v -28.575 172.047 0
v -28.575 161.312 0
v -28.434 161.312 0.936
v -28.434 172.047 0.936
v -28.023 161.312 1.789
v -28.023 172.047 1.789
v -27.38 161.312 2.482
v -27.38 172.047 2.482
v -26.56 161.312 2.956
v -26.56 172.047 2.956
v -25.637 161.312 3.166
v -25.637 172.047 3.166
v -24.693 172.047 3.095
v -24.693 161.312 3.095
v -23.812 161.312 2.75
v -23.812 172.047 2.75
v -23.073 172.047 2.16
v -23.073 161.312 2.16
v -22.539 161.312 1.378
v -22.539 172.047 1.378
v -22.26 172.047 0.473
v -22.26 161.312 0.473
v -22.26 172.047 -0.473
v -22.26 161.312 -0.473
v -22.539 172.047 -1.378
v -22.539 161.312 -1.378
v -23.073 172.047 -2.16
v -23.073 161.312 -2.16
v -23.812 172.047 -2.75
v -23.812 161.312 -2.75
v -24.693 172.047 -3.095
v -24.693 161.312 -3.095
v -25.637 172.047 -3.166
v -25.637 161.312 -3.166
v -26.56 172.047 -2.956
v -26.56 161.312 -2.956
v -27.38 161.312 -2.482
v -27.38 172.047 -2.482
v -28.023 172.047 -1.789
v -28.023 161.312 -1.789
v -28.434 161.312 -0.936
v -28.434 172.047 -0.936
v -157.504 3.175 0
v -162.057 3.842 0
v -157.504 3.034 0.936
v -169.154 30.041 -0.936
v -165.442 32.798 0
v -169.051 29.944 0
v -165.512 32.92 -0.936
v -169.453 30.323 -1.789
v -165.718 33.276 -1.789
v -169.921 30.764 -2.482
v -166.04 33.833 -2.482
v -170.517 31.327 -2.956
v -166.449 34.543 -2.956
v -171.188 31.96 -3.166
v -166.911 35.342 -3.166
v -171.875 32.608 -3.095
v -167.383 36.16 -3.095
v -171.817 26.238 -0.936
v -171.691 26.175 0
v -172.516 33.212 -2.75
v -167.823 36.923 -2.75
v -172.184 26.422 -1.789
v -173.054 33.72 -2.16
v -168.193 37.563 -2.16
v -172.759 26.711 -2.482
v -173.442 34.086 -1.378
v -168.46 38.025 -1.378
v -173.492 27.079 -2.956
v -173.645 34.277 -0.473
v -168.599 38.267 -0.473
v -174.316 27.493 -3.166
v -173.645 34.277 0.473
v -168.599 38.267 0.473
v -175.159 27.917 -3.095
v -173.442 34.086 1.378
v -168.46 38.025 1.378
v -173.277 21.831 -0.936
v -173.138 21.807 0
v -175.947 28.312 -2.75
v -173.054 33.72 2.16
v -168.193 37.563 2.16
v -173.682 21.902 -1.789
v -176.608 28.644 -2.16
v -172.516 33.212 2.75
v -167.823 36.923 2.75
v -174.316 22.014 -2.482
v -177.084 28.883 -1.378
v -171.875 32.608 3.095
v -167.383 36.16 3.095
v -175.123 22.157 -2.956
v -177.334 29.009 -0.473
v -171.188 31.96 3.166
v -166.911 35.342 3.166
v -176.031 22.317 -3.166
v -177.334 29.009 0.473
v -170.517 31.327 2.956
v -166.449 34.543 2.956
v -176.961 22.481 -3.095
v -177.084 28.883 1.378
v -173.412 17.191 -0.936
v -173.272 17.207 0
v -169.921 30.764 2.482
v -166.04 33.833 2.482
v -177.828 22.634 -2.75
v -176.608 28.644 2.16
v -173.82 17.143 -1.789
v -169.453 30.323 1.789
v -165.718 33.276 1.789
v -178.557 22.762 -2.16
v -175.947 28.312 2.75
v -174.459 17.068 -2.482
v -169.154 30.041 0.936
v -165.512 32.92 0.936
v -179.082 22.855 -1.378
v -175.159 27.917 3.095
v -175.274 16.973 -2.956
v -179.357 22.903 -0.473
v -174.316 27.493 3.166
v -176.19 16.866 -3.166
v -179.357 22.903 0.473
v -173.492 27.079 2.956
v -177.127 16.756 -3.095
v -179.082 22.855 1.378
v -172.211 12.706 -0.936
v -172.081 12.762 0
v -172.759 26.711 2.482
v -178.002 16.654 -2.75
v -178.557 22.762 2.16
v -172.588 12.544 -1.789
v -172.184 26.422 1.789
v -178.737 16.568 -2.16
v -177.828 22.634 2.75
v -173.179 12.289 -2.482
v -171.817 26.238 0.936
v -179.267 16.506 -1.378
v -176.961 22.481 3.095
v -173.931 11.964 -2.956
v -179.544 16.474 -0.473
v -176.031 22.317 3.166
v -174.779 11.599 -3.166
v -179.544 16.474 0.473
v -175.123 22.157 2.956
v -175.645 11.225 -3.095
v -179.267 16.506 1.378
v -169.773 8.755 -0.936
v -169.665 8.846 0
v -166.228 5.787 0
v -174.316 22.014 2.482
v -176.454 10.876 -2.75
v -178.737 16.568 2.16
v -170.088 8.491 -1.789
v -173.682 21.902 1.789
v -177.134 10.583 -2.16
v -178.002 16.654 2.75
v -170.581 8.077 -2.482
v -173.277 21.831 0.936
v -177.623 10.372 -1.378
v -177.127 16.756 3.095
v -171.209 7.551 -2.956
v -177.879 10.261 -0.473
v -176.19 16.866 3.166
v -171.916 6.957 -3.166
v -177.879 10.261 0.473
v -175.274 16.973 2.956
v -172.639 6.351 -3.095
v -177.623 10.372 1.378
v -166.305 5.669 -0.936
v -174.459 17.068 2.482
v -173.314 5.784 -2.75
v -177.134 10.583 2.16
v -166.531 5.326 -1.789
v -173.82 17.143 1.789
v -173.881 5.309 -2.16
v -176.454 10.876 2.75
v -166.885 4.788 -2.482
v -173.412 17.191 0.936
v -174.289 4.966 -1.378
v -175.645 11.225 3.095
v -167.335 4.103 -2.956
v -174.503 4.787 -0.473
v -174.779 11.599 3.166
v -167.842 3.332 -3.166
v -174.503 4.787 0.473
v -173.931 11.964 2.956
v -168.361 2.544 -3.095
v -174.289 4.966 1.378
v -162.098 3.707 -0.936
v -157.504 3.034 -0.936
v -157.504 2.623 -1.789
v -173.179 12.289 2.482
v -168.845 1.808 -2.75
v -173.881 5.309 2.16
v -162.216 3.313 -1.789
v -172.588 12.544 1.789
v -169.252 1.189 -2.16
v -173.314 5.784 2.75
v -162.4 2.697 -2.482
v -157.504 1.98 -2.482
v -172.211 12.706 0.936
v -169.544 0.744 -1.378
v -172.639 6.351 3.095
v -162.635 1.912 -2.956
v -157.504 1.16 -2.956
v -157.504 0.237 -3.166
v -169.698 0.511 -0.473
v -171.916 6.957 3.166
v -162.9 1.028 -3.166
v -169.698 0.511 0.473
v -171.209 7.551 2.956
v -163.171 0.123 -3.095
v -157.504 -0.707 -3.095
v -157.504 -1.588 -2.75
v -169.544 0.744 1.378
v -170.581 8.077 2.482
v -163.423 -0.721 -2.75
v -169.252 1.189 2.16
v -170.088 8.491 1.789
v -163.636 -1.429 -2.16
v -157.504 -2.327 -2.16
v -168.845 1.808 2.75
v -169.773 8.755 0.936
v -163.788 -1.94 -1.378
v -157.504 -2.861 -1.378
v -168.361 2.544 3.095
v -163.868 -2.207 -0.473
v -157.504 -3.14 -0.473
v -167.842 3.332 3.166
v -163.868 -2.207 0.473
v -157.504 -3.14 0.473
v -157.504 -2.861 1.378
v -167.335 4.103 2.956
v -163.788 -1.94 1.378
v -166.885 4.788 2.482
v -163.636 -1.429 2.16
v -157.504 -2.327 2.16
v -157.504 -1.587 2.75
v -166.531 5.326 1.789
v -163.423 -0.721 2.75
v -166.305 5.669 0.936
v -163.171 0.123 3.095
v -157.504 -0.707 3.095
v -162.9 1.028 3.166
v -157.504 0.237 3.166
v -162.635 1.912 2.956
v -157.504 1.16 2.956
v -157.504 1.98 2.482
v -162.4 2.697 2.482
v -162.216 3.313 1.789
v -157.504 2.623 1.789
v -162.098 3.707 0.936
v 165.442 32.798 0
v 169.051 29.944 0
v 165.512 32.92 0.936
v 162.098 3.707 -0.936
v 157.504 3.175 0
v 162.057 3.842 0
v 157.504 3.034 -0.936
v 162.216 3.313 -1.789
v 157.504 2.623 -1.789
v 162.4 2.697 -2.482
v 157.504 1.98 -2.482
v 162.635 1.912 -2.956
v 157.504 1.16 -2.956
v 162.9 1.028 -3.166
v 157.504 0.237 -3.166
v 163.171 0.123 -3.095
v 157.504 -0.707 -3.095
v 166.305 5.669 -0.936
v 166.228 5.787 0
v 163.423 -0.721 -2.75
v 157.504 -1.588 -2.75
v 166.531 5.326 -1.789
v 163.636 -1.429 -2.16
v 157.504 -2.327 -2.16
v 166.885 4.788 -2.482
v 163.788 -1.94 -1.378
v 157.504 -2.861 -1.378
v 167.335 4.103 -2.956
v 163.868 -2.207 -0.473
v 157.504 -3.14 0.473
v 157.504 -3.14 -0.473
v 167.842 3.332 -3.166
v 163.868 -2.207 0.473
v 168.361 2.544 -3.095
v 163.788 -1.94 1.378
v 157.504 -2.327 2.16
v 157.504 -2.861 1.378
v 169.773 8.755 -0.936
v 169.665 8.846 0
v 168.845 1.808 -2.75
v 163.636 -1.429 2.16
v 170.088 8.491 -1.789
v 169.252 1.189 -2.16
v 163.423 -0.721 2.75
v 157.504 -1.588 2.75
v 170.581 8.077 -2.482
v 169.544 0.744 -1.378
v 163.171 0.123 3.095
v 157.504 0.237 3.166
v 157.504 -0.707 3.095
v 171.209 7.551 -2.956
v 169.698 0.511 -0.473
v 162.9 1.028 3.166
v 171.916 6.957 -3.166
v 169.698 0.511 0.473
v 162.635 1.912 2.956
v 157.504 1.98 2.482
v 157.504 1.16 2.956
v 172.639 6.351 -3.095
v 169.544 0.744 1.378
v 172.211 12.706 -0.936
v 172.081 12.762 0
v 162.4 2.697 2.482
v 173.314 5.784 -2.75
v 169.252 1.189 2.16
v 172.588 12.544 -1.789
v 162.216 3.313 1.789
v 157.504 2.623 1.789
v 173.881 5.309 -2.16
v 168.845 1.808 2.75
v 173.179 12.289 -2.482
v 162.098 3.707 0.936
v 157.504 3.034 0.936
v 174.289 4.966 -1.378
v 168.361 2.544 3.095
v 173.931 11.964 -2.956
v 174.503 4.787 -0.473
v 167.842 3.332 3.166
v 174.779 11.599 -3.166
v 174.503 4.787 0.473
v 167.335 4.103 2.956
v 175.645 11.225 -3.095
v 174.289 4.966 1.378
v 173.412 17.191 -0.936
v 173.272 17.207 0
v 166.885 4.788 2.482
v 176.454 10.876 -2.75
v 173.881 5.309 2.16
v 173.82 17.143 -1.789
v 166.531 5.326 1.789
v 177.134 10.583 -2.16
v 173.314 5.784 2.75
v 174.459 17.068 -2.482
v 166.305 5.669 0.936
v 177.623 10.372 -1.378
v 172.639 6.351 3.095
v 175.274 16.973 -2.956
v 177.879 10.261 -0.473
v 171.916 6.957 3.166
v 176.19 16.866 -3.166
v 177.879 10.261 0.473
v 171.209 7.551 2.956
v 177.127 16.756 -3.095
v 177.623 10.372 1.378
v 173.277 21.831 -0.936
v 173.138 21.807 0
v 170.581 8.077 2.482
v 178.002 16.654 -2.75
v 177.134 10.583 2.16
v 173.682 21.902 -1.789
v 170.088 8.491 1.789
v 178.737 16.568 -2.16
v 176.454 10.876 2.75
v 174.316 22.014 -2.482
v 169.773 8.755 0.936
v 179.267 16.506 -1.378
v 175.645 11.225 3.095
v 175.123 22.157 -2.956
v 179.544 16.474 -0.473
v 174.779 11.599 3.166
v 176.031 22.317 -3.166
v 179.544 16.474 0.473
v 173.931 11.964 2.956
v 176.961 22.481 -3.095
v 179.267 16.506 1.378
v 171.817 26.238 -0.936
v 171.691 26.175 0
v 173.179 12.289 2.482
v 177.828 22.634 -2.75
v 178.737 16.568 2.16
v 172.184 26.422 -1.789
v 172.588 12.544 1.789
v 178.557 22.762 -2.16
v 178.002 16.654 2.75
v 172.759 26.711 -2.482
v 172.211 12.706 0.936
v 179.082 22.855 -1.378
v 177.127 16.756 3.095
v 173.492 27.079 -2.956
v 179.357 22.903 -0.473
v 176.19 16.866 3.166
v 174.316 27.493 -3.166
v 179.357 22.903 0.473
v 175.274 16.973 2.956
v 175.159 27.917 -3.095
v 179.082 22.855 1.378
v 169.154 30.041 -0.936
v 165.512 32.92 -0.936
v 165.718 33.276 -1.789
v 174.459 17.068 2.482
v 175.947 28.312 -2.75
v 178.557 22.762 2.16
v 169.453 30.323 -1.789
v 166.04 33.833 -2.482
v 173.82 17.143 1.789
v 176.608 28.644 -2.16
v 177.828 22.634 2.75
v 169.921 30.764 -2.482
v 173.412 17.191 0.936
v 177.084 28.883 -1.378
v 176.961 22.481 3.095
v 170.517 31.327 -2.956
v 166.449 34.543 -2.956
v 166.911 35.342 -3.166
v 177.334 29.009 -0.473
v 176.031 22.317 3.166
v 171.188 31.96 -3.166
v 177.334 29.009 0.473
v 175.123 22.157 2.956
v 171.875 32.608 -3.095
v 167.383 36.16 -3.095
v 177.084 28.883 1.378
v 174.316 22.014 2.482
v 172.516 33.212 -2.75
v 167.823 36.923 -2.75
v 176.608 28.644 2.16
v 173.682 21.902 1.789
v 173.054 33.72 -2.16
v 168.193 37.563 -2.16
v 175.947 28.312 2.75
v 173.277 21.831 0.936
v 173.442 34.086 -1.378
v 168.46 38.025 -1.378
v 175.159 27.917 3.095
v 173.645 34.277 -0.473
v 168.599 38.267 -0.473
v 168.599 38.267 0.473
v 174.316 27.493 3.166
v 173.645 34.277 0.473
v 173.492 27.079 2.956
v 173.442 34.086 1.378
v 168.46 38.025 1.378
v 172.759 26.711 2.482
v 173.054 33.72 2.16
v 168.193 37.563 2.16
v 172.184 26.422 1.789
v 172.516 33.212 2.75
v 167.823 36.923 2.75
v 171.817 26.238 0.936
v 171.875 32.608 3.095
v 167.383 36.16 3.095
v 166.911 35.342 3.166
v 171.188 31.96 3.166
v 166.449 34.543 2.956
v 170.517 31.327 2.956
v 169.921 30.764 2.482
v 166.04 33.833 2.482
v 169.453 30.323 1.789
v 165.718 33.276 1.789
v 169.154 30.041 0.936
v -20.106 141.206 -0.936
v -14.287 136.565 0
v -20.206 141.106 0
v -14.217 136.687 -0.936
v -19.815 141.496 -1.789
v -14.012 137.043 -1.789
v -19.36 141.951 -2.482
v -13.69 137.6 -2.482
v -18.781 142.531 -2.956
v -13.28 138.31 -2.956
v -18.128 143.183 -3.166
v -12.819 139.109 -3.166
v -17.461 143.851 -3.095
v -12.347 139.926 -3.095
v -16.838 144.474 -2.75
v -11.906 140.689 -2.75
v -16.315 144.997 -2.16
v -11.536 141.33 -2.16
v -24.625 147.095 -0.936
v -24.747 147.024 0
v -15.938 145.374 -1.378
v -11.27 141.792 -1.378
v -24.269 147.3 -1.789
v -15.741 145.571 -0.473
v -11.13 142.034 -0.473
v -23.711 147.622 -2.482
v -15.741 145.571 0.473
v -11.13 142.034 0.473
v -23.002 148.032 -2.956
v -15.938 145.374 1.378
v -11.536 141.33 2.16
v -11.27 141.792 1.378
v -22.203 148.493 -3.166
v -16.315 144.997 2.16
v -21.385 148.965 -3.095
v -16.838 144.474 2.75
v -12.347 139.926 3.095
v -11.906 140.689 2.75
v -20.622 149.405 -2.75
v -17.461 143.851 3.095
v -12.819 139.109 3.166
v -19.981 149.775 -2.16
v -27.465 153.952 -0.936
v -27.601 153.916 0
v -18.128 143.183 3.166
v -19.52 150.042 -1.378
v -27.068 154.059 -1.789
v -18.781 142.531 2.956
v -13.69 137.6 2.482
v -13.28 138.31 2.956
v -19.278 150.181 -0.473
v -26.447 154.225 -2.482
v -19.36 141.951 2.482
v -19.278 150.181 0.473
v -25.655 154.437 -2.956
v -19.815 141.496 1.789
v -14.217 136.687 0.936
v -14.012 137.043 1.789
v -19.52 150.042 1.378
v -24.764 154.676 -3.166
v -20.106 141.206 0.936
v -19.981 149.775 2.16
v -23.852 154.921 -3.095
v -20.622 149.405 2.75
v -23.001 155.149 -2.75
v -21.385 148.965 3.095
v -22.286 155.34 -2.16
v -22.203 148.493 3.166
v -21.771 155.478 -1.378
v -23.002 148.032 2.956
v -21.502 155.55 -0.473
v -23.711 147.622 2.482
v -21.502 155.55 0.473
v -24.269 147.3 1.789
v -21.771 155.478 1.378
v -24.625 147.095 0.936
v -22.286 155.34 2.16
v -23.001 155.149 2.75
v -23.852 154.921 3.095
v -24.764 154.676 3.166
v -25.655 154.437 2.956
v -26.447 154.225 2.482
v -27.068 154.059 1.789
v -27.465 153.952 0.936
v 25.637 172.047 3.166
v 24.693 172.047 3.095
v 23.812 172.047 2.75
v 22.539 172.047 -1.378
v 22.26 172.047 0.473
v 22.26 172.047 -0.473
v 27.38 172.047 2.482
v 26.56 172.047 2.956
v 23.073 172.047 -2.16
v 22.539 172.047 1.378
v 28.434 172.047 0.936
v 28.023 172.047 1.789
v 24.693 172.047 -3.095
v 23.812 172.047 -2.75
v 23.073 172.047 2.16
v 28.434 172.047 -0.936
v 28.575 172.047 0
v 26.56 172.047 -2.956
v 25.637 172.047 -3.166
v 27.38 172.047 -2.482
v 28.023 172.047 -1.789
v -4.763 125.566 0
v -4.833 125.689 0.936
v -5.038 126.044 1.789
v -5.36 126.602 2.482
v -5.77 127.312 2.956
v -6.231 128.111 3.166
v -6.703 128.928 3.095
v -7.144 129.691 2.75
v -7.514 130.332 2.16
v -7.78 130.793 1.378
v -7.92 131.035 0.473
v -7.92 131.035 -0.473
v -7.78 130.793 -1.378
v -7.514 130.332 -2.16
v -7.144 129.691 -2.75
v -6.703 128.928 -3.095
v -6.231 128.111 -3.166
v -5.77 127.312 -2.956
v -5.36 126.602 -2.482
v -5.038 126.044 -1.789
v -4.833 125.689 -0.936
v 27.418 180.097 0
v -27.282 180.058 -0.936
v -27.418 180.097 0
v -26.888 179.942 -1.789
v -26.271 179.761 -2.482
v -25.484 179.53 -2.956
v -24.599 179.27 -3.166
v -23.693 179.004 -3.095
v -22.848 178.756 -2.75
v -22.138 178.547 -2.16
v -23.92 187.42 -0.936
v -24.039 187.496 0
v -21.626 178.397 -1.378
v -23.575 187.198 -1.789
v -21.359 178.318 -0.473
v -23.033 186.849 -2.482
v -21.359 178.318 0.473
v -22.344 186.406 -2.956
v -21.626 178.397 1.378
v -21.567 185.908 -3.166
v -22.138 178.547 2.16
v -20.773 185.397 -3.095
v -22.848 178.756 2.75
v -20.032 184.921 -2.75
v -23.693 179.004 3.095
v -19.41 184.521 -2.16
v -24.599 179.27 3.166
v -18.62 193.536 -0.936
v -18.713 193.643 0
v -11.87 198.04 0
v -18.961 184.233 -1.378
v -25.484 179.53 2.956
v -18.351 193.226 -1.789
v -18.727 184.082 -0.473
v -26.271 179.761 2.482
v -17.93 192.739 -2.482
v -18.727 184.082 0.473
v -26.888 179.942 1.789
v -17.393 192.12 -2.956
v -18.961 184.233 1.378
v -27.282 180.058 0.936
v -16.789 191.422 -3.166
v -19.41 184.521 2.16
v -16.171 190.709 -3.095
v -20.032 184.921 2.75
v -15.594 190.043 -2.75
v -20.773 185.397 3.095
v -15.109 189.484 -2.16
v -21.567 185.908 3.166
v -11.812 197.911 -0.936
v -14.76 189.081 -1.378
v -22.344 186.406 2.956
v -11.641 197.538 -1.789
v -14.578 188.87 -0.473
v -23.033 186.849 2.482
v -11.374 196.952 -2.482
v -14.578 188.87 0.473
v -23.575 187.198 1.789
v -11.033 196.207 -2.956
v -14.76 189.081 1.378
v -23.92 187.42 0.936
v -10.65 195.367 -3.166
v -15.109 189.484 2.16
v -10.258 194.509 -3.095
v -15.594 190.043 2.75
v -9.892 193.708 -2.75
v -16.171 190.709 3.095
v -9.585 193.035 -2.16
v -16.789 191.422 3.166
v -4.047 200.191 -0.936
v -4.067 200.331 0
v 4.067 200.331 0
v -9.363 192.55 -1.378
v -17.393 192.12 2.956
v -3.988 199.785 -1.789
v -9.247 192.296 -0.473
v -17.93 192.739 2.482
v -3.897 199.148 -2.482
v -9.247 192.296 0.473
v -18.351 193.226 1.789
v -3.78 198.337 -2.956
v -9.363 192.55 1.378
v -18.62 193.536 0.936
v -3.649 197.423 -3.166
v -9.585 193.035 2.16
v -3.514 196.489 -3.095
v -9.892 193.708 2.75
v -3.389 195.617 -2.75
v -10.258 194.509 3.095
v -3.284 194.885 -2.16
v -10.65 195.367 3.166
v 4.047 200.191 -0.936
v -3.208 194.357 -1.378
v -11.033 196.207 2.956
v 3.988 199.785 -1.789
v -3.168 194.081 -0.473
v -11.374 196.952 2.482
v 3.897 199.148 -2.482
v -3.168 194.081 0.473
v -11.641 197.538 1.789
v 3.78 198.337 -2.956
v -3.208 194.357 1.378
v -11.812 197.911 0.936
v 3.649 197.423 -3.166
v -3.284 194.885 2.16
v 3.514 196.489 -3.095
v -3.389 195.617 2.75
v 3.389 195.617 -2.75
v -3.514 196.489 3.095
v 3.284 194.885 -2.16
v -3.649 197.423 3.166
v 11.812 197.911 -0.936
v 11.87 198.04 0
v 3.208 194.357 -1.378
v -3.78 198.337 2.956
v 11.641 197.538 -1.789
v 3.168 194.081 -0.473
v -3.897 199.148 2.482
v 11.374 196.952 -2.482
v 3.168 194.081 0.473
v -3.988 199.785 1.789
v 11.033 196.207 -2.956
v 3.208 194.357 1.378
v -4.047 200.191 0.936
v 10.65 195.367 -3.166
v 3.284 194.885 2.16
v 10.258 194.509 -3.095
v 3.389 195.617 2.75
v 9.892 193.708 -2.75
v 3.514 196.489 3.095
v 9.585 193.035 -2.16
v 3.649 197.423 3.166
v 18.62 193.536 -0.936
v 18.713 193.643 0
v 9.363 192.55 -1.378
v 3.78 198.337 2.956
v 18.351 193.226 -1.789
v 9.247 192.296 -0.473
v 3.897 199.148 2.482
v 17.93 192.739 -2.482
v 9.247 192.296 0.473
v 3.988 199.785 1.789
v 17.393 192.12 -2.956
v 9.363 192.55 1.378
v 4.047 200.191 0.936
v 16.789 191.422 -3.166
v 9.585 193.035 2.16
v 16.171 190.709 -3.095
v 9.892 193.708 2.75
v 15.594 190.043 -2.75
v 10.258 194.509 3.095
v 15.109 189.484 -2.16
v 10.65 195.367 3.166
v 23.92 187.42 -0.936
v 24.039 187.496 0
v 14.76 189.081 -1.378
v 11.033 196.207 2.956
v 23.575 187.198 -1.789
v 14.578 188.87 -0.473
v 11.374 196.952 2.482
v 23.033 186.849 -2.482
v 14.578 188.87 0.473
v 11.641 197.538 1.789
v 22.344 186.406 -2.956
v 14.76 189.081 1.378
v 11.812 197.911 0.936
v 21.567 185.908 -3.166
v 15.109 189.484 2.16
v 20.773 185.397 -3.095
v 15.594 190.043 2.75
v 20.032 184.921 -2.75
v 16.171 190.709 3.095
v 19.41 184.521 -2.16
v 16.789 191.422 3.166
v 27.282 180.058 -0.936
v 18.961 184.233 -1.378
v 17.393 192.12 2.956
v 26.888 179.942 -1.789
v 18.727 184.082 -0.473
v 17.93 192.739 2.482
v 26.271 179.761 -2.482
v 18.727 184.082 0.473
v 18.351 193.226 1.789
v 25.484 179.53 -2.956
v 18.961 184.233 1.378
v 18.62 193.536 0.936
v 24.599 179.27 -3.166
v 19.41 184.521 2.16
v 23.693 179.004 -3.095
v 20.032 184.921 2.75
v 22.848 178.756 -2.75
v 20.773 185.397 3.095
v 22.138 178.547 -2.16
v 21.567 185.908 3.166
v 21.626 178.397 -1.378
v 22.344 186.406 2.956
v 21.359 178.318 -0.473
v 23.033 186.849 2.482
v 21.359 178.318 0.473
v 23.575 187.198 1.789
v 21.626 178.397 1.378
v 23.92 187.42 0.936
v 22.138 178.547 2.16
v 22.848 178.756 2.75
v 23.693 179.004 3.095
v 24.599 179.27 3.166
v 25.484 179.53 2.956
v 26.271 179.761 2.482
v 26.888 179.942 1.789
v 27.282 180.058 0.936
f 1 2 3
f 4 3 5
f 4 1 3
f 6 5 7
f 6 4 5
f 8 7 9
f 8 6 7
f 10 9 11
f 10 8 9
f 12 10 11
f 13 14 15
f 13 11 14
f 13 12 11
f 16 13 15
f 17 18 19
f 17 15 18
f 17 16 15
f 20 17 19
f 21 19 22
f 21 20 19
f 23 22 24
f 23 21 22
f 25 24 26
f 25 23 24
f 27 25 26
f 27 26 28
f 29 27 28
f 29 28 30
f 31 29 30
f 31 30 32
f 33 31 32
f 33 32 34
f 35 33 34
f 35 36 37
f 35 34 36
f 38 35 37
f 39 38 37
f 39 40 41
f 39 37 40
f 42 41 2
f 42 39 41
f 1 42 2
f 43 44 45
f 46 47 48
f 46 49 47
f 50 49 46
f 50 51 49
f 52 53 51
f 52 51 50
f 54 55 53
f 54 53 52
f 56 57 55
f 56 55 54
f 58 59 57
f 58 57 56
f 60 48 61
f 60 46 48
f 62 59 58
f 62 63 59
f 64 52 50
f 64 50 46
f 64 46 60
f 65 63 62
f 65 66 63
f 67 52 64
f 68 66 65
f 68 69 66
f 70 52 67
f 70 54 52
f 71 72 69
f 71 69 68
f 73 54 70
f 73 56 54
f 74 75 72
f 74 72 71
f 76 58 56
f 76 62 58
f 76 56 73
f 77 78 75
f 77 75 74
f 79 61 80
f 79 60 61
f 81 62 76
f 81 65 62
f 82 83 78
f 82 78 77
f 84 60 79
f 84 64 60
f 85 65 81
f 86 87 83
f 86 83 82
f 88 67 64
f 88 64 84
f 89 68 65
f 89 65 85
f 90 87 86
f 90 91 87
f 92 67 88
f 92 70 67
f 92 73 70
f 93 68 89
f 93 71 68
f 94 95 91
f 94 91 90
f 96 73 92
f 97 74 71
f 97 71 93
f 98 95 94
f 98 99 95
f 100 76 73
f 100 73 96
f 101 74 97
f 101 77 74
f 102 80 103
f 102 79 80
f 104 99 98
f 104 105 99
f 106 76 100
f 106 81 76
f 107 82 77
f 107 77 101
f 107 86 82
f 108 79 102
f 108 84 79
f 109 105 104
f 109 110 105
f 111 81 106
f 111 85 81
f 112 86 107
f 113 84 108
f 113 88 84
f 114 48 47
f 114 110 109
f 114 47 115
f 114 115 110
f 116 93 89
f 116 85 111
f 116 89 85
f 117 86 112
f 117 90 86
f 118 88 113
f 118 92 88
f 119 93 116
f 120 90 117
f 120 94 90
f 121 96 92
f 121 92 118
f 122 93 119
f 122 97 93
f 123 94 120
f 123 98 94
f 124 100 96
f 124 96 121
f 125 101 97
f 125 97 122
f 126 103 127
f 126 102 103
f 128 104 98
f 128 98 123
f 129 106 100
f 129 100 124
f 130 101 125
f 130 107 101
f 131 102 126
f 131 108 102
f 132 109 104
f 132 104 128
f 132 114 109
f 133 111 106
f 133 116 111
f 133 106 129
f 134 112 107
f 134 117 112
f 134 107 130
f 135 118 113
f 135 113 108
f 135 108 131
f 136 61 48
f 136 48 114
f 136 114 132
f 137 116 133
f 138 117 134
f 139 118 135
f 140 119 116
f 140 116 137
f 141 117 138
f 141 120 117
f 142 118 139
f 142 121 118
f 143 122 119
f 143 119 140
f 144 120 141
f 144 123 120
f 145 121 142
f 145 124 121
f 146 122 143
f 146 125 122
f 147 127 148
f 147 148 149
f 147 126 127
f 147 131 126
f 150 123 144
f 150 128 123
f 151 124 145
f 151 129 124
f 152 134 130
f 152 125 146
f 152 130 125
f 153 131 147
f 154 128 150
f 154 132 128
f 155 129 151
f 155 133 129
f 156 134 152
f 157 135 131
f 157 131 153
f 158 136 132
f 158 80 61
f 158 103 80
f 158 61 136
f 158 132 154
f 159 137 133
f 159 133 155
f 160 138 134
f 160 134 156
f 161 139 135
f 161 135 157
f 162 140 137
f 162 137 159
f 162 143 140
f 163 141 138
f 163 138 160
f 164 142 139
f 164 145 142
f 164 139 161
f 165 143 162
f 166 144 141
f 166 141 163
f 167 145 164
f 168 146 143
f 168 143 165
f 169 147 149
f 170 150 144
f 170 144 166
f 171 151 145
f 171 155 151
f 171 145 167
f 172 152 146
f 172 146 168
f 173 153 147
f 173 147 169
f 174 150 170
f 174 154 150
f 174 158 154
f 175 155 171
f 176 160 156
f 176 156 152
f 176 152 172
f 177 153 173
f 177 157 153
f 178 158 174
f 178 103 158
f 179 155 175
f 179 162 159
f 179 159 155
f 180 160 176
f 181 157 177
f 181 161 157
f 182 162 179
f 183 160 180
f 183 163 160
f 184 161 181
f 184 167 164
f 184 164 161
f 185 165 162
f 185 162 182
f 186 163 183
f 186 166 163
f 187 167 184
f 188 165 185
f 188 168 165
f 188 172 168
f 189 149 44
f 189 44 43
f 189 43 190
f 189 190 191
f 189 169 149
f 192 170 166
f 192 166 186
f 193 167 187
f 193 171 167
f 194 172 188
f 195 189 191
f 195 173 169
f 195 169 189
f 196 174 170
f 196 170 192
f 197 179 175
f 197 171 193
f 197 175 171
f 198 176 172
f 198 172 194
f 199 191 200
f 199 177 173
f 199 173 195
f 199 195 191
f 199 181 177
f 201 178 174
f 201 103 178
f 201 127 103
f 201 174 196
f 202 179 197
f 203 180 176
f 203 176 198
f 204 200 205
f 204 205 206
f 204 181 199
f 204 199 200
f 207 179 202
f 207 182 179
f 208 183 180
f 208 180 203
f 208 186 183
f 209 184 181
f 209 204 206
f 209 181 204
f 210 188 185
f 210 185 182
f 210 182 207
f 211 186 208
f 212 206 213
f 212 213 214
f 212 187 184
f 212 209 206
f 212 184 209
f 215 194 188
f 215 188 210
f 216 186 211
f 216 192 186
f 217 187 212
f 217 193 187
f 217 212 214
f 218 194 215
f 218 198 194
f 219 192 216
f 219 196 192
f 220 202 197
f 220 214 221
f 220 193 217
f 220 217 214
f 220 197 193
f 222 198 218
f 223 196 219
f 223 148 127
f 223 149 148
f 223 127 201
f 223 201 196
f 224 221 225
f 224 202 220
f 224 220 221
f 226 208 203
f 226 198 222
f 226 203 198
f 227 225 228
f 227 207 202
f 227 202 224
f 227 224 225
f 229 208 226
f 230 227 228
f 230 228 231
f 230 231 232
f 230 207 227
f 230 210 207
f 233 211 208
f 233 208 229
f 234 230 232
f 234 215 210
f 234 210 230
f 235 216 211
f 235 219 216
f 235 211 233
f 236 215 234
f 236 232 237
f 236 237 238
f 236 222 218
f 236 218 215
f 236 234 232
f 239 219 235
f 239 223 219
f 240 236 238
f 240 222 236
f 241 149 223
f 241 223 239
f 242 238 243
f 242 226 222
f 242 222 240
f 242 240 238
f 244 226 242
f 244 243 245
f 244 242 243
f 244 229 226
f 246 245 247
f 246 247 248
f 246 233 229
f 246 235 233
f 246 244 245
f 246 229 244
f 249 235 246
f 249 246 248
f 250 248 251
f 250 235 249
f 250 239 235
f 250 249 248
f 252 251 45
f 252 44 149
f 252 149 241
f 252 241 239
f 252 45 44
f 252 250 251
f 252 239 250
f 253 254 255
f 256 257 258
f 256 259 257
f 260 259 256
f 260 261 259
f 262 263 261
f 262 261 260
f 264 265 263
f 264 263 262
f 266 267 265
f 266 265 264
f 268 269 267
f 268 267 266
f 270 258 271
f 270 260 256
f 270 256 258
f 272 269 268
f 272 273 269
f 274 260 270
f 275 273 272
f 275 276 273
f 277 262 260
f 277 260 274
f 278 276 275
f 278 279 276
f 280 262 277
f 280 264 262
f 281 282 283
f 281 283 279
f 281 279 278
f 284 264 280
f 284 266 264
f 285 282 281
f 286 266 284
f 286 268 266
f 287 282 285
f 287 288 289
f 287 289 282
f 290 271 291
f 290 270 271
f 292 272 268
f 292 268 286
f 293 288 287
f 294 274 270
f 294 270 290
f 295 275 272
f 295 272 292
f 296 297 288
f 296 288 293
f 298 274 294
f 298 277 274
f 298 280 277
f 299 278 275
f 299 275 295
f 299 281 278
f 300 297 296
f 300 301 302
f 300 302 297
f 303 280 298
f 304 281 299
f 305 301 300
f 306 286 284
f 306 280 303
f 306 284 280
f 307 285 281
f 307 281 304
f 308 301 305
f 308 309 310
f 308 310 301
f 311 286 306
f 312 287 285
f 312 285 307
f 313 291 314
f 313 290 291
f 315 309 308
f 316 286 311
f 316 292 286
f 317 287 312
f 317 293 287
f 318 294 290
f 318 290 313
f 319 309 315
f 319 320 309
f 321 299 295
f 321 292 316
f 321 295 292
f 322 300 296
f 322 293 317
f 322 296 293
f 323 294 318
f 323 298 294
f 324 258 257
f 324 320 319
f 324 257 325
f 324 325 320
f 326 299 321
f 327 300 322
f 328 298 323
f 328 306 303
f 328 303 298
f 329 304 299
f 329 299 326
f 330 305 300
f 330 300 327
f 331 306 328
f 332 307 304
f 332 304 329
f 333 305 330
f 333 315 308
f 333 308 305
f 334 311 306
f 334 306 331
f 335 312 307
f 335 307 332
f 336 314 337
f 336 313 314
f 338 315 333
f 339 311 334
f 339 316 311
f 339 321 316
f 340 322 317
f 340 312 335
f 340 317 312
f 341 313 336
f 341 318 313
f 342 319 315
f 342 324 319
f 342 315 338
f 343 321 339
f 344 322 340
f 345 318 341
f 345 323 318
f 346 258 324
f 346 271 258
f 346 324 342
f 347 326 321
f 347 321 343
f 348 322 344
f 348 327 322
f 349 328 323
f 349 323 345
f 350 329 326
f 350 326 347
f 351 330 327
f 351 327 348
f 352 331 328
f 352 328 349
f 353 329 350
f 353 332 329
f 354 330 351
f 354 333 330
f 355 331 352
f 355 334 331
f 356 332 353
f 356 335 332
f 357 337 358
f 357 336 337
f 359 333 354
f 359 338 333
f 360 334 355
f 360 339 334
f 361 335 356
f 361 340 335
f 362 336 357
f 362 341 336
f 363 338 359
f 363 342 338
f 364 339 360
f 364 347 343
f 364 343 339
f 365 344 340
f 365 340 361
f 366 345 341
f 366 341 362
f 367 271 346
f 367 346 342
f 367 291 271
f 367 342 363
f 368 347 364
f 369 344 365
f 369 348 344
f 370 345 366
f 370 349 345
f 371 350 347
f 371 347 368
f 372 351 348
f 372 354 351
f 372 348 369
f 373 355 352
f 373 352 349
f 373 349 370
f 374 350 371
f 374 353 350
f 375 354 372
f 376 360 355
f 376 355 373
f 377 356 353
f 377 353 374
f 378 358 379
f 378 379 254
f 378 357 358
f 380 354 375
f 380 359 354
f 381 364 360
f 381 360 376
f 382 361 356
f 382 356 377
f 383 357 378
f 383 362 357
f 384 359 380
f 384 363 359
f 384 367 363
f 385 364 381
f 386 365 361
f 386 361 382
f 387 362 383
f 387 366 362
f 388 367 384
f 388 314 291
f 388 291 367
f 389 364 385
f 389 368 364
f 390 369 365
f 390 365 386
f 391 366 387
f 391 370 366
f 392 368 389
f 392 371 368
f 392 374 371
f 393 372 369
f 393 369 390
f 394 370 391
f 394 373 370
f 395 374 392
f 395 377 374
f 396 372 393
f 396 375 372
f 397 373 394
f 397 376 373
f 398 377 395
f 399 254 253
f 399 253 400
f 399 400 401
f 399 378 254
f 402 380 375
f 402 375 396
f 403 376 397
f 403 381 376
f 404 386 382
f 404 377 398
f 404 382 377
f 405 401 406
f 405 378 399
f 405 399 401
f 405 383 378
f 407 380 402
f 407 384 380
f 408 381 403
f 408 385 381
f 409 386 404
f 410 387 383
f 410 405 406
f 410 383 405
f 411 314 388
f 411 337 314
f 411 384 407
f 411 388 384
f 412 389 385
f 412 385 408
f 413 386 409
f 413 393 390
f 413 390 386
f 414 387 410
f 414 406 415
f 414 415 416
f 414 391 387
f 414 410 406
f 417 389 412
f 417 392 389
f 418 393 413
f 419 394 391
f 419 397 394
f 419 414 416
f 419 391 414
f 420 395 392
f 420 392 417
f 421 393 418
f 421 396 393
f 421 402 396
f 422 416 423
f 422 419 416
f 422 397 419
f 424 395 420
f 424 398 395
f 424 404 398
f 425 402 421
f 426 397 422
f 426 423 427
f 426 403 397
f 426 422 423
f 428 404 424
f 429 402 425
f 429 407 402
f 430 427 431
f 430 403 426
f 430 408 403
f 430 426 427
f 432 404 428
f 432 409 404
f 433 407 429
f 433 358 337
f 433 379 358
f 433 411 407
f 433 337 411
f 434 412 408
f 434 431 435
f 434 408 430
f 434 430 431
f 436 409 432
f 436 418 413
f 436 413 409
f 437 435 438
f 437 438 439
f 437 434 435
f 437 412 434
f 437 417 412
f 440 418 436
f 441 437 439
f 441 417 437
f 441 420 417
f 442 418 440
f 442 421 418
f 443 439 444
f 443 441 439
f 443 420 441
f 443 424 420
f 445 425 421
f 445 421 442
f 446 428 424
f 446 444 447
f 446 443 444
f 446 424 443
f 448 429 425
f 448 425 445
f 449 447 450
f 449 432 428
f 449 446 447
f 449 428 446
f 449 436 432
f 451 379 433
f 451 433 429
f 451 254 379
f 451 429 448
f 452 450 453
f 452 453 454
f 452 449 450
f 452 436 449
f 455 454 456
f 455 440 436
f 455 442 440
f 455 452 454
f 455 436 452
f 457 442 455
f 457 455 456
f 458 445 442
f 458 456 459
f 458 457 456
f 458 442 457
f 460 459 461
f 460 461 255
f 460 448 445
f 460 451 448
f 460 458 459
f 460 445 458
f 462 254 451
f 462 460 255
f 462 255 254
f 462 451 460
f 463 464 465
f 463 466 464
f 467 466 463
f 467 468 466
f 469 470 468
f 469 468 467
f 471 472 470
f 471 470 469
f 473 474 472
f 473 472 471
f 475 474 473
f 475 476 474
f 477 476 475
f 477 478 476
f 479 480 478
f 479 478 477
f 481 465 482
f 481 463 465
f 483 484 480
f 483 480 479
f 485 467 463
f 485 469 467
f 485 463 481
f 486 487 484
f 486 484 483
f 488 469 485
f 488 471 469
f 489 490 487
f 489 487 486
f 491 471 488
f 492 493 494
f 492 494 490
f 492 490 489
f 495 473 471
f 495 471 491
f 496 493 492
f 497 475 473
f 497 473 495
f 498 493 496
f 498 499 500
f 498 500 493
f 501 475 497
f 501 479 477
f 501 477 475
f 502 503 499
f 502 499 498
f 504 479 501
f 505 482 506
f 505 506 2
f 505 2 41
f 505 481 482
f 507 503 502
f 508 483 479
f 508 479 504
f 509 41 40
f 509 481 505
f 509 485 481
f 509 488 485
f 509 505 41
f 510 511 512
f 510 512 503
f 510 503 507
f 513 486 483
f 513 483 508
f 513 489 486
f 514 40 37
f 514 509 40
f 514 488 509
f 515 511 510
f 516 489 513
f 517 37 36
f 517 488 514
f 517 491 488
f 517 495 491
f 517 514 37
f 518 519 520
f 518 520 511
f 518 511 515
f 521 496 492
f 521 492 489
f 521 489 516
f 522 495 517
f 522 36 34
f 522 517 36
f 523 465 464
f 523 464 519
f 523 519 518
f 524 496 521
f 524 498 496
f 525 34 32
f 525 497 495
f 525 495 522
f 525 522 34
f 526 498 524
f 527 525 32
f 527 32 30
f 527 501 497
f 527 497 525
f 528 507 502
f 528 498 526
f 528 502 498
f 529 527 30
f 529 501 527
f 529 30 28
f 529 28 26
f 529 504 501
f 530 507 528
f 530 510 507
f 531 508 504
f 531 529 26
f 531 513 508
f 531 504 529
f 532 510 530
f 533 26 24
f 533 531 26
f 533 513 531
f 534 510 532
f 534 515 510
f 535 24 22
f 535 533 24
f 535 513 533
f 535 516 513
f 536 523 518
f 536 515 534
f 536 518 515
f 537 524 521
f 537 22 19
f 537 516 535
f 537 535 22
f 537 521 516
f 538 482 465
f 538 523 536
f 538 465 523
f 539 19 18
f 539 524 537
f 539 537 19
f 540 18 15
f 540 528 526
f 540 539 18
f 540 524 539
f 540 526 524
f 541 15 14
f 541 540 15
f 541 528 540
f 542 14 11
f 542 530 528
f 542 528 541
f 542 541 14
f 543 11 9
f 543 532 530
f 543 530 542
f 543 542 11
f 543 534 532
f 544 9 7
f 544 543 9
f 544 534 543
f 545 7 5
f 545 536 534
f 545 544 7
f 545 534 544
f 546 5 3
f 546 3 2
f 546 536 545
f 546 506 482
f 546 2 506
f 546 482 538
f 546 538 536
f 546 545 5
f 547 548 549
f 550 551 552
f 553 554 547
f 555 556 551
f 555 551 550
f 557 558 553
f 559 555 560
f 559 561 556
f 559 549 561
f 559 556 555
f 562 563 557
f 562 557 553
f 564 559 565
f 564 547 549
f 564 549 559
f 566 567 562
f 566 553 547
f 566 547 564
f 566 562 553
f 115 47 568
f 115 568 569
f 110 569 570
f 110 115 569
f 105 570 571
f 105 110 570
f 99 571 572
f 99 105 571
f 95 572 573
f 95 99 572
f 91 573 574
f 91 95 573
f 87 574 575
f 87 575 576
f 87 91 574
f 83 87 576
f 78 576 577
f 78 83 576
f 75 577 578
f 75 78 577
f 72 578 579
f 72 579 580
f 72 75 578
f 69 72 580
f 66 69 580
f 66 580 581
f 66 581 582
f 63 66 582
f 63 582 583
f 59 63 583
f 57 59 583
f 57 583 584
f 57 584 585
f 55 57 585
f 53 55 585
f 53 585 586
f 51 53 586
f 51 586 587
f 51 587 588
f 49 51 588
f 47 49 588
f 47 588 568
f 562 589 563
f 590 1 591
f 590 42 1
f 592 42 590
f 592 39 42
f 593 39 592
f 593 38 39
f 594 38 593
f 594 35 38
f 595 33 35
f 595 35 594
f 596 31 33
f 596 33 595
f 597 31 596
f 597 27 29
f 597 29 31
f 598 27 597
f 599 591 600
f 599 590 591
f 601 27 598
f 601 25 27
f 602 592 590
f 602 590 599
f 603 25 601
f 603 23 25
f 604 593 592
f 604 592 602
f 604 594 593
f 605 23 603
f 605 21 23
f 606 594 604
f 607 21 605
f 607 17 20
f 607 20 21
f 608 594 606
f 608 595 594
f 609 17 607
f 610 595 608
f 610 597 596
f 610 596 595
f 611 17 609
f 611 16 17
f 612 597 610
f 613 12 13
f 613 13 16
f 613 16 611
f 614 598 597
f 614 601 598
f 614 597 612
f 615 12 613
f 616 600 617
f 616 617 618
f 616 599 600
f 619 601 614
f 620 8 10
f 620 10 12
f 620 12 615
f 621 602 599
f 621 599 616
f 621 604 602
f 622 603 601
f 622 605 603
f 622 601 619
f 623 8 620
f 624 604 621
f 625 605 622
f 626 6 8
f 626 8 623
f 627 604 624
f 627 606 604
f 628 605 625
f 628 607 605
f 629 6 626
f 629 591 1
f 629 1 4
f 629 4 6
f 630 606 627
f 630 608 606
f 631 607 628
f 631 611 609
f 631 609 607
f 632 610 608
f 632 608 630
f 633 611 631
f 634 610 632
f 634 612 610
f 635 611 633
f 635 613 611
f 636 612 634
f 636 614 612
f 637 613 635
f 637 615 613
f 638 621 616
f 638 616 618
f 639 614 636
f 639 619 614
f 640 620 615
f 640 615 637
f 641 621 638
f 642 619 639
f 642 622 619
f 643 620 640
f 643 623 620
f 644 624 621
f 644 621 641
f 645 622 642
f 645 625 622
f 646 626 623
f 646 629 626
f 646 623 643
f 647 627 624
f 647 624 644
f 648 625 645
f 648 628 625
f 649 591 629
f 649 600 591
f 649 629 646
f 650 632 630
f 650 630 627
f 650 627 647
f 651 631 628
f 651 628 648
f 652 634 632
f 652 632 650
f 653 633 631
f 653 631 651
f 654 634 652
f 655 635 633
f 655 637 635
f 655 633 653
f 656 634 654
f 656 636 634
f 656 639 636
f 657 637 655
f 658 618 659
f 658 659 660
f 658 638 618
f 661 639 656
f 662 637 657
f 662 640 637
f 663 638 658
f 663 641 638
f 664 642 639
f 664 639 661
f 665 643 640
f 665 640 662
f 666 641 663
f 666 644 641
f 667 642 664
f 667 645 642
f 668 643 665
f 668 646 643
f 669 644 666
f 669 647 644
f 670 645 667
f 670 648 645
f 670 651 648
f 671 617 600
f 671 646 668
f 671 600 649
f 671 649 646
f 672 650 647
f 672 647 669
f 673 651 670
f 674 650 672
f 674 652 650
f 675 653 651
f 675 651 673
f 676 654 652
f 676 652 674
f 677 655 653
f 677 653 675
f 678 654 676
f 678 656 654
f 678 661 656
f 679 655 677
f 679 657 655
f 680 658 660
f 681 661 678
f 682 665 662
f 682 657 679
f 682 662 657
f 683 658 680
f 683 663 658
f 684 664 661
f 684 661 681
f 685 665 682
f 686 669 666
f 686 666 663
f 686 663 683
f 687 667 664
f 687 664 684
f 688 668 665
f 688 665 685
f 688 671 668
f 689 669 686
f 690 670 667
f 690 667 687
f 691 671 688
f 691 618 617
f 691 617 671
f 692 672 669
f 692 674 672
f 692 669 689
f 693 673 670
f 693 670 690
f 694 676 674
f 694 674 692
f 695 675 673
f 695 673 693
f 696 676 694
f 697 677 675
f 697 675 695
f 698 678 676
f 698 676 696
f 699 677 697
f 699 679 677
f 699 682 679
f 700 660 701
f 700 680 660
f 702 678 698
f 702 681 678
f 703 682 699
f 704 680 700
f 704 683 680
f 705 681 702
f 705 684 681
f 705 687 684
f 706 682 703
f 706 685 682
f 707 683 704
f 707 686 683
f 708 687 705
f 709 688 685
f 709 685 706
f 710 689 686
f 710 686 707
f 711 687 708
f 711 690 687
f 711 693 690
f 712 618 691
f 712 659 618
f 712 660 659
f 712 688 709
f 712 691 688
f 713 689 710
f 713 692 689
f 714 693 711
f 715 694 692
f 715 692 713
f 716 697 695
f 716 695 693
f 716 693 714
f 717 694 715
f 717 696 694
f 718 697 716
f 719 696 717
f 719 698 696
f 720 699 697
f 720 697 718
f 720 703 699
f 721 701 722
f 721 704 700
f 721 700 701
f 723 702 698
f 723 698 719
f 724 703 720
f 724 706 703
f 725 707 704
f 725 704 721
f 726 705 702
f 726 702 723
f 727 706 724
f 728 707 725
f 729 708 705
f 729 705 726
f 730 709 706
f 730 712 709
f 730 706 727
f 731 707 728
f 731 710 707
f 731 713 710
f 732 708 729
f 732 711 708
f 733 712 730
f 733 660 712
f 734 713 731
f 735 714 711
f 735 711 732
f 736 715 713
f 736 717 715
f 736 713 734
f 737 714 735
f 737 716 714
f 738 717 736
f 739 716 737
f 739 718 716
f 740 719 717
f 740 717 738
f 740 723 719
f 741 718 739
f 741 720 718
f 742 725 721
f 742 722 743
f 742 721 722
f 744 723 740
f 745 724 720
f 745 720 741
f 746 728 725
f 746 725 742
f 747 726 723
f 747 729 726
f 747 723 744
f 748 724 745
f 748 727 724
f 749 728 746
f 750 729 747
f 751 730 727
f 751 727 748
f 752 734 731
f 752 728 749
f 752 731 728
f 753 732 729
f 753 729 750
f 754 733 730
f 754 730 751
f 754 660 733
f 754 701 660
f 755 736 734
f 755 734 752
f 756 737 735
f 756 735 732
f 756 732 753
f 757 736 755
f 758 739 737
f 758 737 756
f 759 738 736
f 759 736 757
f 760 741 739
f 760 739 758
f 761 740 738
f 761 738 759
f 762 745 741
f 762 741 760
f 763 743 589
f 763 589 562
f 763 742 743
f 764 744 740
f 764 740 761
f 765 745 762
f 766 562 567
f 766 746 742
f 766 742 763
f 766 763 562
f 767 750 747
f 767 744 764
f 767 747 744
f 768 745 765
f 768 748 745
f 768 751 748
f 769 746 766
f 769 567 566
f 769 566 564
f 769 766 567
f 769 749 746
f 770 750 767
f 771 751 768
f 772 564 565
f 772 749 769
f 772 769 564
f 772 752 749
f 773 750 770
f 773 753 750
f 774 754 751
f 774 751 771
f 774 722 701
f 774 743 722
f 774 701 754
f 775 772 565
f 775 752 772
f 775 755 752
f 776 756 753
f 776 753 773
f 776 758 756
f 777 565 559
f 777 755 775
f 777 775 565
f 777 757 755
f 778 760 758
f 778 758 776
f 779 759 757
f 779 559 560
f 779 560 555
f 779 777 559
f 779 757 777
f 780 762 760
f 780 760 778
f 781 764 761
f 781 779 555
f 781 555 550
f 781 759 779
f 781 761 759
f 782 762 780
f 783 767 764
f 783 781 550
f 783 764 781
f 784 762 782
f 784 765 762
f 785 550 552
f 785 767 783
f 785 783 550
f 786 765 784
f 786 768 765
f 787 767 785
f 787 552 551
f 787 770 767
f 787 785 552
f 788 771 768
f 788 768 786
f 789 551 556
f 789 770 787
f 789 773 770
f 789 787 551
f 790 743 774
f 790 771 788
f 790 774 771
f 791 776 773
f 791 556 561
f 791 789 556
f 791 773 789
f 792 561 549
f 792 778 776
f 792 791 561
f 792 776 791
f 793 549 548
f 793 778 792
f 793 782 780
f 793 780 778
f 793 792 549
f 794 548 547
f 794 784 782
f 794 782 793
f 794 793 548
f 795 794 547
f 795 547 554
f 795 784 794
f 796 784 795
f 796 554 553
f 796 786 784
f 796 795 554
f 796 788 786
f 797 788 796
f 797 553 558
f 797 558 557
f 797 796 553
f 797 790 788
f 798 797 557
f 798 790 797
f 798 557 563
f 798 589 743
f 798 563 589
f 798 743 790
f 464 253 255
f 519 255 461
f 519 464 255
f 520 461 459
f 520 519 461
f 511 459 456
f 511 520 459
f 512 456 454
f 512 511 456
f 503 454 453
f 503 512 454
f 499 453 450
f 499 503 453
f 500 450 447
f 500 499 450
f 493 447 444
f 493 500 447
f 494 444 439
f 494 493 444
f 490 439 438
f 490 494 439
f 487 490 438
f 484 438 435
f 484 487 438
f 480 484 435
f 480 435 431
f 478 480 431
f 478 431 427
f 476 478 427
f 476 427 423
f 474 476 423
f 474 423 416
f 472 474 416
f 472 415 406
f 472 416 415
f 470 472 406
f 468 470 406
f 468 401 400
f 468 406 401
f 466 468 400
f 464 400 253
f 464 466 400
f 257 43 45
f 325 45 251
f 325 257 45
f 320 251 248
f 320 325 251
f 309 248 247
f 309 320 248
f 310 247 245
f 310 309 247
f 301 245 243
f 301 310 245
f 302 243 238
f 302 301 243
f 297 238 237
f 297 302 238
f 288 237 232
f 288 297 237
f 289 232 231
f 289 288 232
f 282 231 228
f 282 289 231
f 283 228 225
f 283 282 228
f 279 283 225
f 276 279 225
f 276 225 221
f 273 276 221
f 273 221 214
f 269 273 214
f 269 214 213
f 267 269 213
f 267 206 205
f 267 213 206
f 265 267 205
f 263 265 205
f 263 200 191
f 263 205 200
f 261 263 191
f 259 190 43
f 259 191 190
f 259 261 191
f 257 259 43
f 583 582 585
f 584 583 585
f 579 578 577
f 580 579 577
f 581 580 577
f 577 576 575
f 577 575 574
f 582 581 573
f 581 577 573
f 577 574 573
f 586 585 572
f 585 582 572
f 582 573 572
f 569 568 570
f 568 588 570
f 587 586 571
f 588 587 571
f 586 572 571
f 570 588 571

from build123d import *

# Parameters (mm, degrees)
SWEEP2_PROFILE_R = 3.175


with BuildPart() as part:
    # Sweep2: sweep along a path in Sketch1
    with BuildLine(Plane.XY) as sweep2_path:
        Line((-6.35, 128.316097327), (-167.029432116, 35.547783942))
        ThreePointArc((-167.029432116, 35.547783942), (-175.905319107, 14.119497191), (-157.504432116, 0))
        Line((-157.504432116, 0), (0, 0))
        Line((0, 0), (157.504432116, 0))
        ThreePointArc((157.504432116, 0), (175.905319107, 14.119497191), (167.029432116, 35.547783942))
        Line((167.029432116, 35.547783942), (-12.7, 139.314619955))
        ThreePointArc((-12.7, 139.314619955), (-21.997045256, 148.611665212), (-25.4, 161.311665212))
        Line((-25.4, 161.311665212), (-25.4, 172.046968374))
        ThreePointArc((-25.4, 172.046968374), (0, 197.446968374), (25.4, 172.046968374))
    # Sweep2 profile (on start of the path) → Sweep2 (sweep)
    with BuildSketch(Plane(origin=(-6.35, 128.316097327, 0), x_dir=(0.49999999999999517, -0.8660254037844415, 0), z_dir=(-0.8660254037844415, -0.49999999999999517, 0))):
        Circle(SWEEP2_PROFILE_R)
    sweep(path=sweep2_path.line)


solid = part.part
